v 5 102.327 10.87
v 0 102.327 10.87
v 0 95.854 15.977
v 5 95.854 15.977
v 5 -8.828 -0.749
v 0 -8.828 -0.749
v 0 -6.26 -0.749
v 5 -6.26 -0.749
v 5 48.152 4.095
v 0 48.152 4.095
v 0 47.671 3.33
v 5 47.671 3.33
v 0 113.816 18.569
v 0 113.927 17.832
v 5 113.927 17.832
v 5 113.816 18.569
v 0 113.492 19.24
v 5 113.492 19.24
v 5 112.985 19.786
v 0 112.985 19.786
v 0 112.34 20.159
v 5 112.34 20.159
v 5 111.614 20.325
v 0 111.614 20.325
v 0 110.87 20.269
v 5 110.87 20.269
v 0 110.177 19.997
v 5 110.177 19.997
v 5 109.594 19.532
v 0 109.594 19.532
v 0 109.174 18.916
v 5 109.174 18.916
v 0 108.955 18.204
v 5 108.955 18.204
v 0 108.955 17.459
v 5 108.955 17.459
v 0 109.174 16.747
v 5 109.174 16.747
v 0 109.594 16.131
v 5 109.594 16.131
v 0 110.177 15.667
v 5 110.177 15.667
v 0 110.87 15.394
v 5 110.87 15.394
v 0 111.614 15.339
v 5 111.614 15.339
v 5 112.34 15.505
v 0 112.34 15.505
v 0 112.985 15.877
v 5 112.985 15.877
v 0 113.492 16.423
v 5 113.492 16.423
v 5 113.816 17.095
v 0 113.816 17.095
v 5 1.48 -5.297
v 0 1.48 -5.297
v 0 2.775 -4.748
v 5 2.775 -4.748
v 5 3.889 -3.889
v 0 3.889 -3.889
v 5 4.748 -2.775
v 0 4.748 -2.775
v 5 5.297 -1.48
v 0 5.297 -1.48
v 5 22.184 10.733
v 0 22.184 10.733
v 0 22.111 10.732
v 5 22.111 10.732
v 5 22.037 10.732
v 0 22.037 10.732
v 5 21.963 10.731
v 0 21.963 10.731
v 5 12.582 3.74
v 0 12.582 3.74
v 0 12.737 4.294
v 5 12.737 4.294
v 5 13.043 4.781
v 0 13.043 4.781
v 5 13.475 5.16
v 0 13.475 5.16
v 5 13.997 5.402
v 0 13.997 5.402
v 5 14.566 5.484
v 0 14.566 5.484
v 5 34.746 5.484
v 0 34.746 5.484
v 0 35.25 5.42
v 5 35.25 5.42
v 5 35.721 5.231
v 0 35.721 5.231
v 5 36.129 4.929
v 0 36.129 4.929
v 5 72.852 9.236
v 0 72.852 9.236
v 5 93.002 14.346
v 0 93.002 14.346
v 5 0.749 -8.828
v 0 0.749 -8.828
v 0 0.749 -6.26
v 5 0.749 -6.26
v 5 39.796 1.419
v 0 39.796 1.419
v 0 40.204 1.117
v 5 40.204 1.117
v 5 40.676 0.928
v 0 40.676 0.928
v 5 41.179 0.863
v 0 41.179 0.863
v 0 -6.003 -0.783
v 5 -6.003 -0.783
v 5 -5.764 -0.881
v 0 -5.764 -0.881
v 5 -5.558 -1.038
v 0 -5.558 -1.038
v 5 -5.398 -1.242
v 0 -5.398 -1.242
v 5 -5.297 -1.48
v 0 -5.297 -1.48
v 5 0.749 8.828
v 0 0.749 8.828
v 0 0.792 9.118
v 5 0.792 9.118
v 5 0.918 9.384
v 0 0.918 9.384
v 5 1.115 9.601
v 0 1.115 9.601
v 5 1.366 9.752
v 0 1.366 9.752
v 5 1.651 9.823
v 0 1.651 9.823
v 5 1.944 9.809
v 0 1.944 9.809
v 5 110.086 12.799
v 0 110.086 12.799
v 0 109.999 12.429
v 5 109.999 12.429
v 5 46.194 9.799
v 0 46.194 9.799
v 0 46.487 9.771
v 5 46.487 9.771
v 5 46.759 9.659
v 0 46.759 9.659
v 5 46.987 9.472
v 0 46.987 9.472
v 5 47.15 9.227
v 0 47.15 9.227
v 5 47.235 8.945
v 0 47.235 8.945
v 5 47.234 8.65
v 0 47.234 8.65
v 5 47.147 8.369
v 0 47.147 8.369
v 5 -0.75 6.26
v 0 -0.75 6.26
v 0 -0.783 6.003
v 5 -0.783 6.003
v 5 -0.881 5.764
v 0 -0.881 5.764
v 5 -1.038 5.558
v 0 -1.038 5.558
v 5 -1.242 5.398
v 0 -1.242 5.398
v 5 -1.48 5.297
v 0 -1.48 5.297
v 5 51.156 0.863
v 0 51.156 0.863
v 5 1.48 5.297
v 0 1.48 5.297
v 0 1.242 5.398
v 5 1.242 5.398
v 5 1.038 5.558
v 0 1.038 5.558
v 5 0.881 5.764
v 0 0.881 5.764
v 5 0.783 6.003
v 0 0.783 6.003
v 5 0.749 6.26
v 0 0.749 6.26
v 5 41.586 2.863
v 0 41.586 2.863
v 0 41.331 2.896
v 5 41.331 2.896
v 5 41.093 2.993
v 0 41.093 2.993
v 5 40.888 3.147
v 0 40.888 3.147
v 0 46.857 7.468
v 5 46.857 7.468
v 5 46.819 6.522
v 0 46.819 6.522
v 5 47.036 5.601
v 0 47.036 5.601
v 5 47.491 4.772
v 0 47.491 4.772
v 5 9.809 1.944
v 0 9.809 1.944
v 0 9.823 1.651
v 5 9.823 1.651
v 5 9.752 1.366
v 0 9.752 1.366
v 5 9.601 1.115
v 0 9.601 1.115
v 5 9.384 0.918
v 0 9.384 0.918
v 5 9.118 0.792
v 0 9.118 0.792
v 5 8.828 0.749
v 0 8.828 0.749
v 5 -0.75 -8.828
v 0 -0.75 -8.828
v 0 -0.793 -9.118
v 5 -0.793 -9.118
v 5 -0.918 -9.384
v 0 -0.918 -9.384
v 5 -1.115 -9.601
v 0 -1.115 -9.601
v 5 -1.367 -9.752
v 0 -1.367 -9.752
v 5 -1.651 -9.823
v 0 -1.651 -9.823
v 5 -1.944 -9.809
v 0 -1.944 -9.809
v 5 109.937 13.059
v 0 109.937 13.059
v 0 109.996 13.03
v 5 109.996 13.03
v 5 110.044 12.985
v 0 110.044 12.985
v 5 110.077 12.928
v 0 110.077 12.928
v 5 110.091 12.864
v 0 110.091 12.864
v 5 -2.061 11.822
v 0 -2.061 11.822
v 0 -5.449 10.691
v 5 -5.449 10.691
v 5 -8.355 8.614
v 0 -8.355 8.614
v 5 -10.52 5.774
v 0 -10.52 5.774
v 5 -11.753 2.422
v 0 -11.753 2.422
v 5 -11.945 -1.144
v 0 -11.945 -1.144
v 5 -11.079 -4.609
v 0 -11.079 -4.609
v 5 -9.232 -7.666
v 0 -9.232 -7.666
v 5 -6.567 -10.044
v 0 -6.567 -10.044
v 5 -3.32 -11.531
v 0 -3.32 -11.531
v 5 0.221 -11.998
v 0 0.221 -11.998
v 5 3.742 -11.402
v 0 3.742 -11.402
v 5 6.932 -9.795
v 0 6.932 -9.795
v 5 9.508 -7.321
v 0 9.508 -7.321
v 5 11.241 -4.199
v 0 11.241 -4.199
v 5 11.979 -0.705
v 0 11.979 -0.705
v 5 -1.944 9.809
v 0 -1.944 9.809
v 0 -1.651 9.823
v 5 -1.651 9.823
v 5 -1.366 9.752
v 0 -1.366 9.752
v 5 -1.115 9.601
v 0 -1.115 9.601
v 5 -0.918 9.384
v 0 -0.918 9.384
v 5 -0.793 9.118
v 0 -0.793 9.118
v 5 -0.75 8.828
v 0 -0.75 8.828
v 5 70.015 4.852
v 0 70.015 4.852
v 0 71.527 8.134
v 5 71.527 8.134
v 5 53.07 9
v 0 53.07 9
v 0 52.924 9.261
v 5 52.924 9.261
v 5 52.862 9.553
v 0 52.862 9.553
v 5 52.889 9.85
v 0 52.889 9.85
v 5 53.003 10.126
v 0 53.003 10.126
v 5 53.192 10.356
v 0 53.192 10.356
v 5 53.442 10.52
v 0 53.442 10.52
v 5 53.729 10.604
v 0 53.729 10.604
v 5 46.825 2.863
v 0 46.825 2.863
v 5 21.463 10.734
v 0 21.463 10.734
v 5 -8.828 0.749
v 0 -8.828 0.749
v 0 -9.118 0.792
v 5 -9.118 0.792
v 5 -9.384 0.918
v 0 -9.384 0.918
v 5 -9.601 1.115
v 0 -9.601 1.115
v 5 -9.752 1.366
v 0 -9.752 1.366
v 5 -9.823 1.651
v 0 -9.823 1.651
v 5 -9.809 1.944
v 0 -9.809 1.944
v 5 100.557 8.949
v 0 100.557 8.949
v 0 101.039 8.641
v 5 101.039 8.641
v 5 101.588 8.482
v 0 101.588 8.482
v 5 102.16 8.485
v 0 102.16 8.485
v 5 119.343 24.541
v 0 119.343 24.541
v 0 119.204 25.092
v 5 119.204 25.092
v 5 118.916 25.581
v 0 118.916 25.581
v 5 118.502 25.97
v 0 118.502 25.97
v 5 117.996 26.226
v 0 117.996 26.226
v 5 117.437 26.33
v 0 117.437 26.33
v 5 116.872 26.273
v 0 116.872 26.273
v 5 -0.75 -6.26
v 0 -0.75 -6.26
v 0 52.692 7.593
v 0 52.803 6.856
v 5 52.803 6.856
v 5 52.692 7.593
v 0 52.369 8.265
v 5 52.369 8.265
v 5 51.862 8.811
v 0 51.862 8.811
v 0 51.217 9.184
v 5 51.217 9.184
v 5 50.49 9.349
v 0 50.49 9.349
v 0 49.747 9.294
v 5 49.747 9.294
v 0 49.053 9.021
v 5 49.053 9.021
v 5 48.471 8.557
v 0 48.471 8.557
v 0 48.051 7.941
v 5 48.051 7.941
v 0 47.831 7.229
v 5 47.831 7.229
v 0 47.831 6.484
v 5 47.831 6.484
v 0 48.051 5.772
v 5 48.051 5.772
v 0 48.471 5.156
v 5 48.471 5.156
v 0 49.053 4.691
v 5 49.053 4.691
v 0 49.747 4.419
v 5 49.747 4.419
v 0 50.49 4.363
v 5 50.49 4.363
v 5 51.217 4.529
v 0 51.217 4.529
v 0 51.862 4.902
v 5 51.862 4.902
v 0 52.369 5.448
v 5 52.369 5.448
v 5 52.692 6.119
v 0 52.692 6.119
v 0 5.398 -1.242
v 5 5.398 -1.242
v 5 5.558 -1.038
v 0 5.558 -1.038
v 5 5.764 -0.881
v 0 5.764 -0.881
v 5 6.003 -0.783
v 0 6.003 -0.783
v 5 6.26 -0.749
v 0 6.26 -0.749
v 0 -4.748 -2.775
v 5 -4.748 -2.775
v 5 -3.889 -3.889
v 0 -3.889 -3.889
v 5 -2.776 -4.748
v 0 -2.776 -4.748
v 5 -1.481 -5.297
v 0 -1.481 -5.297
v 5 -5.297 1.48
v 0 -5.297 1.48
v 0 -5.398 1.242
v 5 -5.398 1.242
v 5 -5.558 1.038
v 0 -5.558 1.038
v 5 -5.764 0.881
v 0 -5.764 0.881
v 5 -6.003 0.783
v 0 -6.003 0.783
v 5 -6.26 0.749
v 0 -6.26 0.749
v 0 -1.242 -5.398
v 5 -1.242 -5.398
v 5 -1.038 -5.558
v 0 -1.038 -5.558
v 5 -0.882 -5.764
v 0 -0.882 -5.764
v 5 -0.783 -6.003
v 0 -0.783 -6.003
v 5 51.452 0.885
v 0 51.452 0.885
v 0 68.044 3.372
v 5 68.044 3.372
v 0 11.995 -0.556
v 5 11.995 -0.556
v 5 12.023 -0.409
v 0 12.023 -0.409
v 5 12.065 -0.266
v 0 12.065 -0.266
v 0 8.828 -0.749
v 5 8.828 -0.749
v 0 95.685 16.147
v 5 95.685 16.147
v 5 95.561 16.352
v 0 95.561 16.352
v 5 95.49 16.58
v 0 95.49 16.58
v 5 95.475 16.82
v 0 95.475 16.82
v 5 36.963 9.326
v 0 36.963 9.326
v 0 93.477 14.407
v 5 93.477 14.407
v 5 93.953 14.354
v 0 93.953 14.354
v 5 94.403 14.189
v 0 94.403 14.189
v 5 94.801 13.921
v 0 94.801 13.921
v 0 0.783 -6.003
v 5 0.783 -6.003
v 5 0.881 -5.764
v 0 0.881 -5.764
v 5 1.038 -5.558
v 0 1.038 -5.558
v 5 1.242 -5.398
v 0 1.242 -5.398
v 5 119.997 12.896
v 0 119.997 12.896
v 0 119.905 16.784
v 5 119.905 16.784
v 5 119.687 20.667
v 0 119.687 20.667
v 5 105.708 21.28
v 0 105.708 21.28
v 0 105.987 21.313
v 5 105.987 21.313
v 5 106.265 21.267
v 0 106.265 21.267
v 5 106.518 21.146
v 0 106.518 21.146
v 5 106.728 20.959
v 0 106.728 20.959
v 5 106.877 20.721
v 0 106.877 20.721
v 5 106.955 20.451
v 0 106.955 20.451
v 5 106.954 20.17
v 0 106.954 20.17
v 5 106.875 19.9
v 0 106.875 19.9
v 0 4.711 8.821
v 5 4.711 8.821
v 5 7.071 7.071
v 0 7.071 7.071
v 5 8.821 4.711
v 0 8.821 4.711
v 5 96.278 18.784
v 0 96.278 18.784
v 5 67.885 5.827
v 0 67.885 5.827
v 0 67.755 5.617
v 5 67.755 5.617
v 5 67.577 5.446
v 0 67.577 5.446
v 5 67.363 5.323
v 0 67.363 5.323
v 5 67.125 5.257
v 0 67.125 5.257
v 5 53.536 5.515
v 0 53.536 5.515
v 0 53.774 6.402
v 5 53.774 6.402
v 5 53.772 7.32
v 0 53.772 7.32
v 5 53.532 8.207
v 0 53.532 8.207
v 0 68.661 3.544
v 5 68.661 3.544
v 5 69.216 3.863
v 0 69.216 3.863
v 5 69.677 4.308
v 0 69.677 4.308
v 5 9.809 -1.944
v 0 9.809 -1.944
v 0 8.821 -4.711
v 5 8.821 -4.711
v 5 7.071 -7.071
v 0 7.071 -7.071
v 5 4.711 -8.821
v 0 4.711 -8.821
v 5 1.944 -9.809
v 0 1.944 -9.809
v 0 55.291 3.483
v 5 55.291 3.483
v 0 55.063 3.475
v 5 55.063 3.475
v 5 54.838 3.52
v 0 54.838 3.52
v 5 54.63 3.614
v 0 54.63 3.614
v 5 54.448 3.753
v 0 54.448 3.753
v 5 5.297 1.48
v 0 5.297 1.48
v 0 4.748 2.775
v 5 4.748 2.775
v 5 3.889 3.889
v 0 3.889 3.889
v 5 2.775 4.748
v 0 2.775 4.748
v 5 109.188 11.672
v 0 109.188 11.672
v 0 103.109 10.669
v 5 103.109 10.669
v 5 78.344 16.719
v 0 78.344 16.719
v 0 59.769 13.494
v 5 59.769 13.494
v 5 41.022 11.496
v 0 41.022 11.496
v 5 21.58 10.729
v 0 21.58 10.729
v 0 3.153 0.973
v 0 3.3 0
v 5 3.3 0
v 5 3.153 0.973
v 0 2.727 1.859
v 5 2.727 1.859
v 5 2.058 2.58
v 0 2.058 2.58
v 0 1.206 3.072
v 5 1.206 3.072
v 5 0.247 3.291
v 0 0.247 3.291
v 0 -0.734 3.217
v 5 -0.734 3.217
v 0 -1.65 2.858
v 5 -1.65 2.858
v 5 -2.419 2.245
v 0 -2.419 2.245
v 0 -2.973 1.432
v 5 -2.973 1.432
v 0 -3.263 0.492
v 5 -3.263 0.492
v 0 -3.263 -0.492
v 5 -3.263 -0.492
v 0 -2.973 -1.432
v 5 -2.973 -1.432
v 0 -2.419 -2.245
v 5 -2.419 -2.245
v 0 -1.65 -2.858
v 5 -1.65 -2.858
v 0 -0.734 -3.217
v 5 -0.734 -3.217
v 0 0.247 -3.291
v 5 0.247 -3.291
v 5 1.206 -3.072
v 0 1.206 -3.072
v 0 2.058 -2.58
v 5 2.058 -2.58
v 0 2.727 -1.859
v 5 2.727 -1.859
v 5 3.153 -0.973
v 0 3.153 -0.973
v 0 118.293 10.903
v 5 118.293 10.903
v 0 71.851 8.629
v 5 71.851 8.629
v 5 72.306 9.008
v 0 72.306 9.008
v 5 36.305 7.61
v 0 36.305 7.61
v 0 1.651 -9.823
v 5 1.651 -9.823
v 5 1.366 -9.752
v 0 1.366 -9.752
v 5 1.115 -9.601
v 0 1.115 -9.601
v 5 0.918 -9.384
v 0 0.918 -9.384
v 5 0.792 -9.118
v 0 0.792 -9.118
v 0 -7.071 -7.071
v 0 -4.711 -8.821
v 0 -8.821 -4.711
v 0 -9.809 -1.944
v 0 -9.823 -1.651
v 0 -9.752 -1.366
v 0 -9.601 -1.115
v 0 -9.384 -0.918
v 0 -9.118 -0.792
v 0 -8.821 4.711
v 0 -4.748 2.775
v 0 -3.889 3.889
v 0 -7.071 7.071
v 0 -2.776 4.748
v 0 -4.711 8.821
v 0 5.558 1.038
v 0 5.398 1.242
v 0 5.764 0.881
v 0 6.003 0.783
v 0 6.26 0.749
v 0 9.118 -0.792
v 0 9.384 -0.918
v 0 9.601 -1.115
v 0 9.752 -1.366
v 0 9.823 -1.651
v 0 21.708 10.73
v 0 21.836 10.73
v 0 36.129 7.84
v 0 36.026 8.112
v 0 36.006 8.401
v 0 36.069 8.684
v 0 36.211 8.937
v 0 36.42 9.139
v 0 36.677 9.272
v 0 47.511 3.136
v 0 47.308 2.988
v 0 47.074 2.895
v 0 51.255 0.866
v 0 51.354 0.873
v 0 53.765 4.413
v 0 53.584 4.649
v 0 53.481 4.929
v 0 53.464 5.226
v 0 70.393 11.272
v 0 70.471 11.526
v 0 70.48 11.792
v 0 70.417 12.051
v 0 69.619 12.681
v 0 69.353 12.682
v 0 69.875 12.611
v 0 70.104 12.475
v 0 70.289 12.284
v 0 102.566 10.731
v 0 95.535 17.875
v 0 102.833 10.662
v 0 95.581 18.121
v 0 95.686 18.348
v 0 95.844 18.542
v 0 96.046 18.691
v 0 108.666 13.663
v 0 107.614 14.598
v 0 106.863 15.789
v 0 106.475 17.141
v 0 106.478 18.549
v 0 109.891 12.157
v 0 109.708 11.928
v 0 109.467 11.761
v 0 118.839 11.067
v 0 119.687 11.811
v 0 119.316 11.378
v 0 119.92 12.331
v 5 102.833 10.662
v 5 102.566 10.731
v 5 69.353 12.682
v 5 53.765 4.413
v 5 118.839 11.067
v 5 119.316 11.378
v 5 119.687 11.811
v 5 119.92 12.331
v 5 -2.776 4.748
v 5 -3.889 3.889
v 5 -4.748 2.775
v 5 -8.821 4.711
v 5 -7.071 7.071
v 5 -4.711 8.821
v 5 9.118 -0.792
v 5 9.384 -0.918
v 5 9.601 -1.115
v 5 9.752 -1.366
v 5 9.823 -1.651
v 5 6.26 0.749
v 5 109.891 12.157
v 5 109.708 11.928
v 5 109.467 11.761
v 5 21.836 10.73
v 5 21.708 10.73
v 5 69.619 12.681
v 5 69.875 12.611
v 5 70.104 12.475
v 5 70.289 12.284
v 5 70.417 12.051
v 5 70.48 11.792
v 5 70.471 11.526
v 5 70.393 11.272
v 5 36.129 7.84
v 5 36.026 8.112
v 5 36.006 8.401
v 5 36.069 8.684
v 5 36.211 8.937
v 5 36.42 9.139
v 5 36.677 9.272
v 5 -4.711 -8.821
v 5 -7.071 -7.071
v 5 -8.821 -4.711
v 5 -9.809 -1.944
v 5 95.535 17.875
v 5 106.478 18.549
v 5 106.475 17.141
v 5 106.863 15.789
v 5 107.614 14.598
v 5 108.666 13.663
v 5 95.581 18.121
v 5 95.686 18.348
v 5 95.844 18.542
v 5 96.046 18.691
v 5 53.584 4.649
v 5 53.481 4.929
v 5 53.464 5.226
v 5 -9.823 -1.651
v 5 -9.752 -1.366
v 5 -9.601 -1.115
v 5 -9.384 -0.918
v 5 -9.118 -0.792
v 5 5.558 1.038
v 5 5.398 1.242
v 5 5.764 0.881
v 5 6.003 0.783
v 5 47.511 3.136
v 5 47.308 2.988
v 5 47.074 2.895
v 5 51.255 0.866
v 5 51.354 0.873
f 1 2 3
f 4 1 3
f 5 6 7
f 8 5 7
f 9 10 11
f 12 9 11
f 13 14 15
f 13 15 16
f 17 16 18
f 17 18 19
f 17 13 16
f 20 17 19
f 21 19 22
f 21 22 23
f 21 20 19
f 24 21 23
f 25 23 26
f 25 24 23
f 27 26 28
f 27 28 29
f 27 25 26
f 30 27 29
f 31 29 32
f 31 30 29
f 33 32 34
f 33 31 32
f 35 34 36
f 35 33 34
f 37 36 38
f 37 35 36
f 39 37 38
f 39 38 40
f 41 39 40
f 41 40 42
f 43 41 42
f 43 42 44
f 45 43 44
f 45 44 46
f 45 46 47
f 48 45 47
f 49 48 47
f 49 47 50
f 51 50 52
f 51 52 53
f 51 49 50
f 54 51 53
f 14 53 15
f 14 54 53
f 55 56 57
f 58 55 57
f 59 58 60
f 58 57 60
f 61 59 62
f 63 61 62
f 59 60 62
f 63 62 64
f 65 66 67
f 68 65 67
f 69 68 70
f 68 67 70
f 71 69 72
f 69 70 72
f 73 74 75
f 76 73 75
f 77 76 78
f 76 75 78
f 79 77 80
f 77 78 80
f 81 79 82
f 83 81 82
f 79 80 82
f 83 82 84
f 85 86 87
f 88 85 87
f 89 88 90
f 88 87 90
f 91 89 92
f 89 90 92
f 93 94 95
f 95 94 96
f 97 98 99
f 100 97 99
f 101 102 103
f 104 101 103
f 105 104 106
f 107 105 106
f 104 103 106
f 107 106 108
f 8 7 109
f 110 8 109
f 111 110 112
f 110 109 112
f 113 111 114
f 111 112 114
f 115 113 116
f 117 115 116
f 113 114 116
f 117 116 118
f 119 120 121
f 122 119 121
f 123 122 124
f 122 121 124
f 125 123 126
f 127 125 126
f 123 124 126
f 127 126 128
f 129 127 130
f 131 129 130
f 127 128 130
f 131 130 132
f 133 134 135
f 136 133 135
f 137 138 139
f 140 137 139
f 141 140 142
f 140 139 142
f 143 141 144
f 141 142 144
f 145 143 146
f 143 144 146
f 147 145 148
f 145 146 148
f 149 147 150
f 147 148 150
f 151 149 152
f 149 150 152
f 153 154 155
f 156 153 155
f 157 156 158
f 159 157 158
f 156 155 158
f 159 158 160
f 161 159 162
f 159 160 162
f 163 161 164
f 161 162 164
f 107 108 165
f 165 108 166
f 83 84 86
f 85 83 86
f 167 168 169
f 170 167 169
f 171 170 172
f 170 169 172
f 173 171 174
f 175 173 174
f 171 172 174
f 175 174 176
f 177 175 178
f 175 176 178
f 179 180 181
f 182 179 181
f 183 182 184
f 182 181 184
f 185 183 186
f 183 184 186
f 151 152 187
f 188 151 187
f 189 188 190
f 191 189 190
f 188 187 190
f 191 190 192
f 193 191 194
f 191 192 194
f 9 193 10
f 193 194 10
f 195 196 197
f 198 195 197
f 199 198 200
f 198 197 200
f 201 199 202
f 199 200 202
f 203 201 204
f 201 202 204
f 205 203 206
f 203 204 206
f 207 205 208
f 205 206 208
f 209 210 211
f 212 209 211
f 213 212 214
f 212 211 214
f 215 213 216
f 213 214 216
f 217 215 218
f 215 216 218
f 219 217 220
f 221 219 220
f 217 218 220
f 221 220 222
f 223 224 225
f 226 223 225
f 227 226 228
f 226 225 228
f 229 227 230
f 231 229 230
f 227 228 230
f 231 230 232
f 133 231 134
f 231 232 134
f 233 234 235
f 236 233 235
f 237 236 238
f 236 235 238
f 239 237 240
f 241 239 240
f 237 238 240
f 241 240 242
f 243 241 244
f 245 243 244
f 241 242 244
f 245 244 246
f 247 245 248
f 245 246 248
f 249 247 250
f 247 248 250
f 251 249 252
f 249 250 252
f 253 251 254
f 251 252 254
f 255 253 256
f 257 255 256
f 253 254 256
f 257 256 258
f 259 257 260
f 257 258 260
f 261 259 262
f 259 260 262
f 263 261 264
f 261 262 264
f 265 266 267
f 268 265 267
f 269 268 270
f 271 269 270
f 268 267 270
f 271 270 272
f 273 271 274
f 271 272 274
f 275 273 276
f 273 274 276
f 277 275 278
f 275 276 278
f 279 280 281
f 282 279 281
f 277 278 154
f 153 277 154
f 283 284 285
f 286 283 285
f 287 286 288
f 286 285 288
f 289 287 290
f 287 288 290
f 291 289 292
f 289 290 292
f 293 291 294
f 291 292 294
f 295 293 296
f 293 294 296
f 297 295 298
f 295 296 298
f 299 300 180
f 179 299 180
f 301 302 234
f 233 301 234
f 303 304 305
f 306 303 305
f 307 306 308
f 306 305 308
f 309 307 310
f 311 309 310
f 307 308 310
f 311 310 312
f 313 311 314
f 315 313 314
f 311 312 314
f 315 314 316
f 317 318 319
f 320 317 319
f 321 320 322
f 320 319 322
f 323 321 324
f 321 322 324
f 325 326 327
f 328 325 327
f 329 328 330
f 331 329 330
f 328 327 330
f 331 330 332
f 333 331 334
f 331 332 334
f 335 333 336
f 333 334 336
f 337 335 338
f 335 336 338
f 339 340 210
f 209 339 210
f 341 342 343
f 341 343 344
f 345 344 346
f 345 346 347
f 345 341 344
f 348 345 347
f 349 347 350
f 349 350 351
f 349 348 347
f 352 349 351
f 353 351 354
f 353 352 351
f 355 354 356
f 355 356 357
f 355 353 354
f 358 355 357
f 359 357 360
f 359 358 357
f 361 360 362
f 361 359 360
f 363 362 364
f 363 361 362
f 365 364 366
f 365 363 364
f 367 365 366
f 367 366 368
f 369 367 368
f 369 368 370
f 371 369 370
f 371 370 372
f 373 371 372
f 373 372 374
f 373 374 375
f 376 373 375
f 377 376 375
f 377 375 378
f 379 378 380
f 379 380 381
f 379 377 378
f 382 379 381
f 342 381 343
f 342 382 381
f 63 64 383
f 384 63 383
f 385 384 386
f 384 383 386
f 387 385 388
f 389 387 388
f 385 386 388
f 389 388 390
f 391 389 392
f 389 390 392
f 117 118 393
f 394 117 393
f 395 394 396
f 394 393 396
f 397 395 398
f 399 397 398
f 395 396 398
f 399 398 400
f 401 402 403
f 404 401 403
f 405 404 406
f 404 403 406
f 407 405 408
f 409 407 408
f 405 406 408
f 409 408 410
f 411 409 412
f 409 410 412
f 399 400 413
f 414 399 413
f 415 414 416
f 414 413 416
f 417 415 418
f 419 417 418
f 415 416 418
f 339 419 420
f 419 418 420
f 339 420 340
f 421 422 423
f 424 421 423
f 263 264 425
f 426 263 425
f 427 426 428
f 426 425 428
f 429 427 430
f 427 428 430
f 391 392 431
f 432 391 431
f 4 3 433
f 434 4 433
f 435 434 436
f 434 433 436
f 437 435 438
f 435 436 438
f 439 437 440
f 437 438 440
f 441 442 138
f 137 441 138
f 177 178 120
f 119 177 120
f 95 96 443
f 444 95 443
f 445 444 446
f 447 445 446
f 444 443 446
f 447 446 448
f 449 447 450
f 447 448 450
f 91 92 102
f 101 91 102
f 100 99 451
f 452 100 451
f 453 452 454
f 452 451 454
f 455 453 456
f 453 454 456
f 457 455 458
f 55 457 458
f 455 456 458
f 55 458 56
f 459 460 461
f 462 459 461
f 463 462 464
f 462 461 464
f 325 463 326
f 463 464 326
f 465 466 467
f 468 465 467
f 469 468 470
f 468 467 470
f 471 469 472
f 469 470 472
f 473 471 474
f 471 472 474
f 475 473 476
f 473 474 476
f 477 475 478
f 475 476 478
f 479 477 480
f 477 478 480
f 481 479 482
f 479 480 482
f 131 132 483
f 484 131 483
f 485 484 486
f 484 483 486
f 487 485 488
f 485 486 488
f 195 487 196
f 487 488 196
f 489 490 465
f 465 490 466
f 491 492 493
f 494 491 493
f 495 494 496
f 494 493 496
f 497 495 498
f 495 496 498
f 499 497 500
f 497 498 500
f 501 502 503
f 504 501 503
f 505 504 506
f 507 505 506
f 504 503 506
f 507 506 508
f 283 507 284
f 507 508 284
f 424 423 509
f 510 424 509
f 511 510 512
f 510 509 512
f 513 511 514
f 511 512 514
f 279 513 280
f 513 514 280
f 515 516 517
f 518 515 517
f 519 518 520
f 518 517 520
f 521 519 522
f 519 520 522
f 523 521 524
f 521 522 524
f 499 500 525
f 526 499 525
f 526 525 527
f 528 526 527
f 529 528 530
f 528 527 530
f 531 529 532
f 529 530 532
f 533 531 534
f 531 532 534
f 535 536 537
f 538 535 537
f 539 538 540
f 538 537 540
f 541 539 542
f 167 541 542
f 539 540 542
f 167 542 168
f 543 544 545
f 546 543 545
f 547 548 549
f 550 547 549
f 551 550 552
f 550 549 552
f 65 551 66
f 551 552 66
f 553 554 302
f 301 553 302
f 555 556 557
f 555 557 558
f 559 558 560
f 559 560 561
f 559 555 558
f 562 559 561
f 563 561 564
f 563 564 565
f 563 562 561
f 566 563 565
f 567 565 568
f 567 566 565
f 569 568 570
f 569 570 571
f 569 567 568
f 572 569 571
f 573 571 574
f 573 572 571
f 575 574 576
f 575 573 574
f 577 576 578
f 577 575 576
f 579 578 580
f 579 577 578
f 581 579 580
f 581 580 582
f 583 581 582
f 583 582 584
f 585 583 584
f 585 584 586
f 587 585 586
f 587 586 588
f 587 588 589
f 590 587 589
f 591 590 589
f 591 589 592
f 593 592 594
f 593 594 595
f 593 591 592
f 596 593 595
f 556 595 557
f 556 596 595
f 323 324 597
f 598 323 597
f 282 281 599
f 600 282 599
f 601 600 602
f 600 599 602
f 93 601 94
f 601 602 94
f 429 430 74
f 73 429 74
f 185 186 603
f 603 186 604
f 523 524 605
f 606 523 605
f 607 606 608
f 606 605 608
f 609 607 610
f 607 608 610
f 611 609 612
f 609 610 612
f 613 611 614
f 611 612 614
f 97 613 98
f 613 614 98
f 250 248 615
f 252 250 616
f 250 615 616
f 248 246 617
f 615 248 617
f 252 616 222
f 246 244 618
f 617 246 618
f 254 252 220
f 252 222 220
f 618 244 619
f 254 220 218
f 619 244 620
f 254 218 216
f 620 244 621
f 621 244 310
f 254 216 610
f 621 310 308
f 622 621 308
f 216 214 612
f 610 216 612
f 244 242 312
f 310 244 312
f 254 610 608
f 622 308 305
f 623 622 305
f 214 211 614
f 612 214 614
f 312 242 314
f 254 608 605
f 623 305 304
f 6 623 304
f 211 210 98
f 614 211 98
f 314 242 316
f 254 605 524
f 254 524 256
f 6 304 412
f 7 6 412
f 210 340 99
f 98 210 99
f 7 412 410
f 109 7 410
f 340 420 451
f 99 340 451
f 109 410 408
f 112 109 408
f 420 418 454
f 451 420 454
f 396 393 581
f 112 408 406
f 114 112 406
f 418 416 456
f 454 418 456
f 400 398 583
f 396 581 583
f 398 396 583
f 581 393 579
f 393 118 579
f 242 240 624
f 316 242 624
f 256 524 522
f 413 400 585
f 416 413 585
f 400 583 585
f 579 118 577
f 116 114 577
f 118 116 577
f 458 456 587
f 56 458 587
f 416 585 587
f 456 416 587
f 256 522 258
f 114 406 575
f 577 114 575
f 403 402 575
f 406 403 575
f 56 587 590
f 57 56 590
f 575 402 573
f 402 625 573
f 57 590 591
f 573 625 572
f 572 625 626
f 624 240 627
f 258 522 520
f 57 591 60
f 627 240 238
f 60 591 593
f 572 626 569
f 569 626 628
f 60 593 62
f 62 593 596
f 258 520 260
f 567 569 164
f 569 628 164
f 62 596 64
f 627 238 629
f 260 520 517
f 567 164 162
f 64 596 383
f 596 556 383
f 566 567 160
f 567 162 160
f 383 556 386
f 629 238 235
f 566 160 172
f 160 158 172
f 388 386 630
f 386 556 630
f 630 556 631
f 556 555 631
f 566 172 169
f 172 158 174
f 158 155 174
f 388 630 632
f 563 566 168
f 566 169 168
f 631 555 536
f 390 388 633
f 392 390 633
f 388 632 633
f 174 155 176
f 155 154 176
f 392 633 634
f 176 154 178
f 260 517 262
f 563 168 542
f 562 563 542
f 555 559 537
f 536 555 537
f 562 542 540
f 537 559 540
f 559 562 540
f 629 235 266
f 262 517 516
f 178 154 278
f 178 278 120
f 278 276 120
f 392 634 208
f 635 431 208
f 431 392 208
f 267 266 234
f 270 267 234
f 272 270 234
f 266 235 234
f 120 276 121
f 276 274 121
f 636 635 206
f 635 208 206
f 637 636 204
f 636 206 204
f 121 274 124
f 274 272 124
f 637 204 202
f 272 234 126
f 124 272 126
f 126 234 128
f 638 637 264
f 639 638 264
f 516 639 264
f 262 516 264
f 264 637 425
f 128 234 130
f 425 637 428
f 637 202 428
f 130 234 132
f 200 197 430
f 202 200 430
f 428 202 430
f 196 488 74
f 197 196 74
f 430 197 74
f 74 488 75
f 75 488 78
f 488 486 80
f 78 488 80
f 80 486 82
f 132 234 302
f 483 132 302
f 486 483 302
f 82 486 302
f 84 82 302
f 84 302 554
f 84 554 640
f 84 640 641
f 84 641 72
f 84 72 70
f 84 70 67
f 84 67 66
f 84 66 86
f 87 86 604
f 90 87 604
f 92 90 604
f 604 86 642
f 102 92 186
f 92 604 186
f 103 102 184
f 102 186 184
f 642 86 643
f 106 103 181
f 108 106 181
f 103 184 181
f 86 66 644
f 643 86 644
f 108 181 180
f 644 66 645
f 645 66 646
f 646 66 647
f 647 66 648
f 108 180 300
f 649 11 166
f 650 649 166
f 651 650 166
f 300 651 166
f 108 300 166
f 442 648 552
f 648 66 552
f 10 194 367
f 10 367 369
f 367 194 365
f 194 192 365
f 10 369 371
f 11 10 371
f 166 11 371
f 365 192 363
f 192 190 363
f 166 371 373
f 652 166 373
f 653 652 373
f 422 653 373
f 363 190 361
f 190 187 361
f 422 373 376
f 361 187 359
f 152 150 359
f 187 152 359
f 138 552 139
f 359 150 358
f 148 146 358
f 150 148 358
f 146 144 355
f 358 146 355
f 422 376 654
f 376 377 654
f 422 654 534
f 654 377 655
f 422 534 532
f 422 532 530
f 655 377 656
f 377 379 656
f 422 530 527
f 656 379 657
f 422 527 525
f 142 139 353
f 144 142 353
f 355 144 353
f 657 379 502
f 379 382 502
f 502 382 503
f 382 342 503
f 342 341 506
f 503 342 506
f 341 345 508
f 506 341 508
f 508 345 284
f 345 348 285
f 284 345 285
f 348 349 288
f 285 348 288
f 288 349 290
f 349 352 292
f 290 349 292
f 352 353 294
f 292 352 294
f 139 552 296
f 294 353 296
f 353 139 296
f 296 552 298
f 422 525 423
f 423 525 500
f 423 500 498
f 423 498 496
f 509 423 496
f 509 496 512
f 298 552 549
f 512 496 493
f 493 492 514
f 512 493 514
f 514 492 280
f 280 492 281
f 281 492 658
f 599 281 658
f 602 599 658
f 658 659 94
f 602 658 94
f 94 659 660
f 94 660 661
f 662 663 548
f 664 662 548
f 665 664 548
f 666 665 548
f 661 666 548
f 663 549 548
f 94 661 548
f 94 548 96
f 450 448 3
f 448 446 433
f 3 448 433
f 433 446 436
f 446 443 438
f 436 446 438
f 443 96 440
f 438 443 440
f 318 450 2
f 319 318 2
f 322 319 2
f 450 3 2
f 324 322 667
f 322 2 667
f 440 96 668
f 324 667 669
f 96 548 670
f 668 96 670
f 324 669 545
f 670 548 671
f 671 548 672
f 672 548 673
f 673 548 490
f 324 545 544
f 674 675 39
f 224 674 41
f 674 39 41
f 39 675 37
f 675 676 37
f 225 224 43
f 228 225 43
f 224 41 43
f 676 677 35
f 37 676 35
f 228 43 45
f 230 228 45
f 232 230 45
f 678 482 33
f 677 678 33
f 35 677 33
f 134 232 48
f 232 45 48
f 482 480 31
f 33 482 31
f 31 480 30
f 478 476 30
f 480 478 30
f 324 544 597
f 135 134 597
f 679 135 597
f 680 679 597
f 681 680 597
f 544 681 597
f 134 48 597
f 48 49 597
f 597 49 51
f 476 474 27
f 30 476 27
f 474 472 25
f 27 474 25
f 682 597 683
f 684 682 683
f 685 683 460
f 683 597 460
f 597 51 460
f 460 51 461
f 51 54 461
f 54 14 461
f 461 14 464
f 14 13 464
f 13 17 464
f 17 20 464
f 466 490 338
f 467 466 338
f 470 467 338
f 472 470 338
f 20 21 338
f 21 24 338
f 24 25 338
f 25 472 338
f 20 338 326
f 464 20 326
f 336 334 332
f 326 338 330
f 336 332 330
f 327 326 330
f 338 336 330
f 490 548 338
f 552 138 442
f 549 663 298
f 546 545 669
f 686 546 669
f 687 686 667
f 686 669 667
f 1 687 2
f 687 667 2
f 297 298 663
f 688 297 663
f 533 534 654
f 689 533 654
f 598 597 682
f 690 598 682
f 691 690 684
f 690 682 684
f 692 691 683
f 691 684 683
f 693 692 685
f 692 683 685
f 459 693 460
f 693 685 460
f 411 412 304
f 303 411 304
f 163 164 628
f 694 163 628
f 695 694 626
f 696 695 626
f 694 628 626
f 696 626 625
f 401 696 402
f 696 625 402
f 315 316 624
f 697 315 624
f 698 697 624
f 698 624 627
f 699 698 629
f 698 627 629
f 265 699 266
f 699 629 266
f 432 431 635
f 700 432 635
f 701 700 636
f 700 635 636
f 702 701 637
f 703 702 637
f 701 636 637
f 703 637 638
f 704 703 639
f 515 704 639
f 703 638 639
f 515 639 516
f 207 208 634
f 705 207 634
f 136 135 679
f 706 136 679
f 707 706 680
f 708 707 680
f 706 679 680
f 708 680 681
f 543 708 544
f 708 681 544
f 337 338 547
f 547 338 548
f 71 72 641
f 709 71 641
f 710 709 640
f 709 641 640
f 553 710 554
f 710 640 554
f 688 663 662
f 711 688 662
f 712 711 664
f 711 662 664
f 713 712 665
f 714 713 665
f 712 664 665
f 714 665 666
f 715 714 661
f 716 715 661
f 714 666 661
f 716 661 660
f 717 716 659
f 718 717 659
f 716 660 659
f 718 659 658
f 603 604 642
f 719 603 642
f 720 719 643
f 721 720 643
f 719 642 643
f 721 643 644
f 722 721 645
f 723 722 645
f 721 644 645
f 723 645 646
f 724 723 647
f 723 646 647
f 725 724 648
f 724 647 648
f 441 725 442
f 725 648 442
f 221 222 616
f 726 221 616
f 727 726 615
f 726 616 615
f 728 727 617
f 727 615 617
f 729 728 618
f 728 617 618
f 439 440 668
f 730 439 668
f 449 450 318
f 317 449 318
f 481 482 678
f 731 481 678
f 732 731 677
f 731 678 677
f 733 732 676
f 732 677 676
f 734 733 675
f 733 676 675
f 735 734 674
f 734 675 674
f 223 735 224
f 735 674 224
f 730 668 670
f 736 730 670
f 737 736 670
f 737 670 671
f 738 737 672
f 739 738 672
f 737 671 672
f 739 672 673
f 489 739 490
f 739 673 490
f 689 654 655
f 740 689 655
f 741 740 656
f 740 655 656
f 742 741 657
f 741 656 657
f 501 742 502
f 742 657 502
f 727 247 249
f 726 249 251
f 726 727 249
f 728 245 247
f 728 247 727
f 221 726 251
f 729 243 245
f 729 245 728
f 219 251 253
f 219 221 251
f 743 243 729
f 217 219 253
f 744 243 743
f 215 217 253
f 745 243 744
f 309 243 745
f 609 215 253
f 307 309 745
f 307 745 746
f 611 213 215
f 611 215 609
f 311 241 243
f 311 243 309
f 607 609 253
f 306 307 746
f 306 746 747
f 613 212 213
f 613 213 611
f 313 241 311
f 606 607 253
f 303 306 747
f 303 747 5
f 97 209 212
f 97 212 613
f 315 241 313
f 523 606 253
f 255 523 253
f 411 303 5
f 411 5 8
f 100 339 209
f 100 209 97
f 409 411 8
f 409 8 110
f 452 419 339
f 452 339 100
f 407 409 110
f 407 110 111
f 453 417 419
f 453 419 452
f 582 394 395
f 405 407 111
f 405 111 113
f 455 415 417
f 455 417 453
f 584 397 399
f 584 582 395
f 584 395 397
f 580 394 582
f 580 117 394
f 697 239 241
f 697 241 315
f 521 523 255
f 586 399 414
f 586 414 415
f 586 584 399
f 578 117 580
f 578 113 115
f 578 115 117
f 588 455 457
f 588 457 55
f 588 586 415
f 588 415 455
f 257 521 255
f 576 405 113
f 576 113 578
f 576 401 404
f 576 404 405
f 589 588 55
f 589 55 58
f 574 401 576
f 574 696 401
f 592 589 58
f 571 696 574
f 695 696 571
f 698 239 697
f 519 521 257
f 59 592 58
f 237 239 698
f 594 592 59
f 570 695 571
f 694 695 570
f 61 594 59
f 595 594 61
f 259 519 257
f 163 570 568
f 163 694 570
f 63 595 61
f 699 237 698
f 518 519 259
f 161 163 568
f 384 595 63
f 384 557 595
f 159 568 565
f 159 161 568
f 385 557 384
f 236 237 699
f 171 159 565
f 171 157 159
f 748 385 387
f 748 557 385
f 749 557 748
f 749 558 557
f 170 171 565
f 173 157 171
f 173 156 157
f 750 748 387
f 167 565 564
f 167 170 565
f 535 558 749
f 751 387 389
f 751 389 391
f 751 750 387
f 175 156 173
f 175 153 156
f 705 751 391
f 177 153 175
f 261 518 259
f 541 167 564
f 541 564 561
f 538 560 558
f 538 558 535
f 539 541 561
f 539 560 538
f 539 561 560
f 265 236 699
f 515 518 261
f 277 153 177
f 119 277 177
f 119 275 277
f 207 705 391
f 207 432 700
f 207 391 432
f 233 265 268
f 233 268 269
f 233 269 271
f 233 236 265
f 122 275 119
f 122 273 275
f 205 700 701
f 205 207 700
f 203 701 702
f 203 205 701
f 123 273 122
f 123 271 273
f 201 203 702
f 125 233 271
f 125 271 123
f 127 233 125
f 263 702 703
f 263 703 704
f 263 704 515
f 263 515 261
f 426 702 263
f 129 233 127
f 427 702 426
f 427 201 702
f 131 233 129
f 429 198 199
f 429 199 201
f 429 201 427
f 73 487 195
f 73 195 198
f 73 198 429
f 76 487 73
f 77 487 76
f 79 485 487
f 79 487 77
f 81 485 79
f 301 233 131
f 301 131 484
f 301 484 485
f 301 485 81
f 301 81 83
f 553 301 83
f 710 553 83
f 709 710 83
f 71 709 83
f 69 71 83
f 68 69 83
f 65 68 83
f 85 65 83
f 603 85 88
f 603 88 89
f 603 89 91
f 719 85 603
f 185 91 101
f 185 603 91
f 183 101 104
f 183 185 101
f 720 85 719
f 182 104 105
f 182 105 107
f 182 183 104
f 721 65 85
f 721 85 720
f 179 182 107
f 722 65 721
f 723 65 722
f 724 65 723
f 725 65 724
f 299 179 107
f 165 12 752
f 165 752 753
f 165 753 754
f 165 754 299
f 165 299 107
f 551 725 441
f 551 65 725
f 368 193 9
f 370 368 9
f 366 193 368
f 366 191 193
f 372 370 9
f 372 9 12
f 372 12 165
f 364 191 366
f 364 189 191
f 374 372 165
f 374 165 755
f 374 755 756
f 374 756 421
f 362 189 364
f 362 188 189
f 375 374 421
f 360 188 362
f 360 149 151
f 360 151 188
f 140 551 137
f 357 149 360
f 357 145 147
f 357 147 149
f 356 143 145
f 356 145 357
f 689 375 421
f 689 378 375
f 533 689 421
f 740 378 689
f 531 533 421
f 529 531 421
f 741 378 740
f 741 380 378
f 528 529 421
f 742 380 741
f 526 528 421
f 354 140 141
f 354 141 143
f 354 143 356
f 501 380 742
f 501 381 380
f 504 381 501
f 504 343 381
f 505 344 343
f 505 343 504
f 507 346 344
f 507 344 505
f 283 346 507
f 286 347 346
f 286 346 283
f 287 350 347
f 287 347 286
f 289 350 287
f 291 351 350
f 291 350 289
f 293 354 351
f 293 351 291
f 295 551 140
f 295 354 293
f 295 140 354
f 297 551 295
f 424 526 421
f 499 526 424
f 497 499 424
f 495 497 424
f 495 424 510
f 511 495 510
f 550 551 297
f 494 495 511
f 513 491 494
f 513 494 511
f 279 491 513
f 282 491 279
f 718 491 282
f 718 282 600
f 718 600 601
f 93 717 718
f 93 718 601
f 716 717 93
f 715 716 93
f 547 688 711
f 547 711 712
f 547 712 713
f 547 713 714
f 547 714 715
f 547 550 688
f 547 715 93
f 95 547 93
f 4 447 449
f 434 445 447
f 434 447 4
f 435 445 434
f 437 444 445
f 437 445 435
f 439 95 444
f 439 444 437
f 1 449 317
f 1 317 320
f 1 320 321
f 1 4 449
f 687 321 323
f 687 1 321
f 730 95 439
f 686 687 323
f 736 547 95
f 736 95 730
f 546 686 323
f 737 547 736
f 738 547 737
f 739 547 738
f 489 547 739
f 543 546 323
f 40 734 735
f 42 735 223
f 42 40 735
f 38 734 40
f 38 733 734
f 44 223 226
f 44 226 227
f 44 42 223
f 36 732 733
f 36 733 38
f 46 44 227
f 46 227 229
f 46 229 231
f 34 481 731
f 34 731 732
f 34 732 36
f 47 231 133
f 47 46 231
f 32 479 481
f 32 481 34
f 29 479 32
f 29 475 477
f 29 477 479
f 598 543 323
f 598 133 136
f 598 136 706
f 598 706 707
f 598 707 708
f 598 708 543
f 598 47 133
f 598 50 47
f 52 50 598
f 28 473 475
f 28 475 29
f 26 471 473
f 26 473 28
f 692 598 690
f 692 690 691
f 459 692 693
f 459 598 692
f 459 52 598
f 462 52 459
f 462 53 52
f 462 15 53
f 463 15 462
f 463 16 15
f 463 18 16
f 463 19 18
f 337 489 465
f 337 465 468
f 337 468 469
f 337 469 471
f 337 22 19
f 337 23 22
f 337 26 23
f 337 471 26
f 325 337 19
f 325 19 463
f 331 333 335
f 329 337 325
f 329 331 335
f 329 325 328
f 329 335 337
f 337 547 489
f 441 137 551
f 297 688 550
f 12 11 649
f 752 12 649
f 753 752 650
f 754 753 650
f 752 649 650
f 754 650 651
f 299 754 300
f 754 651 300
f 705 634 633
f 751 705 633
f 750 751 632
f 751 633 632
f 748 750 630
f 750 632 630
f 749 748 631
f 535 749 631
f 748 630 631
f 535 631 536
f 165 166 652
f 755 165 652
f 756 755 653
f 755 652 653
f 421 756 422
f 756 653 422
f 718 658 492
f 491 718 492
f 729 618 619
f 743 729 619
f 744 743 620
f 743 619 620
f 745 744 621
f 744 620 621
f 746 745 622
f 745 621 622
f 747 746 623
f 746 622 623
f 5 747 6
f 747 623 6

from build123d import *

# Parameters (mm, degrees)
F0_R     = 3.3
F0_R_2   = 2.5
F1_DEPTH = 5


with BuildPart() as f1:
    # F0 (on Right) → F1 (new body)
    with BuildSketch(Plane.YZ):
        with BuildLine():
            ThreePointArc((21.963381, 10.731182), (21.963038, 10.725257), (21.962693, 10.719332))
            ThreePointArc((21.962693, 10.719332), (22.073674, 10.724516), (22.184469, 10.732781))
            ThreePointArc((22.184469, 10.732781), (22.073925, 10.73196), (21.963381, 10.731182))
        make_face()
        with BuildLine():
            ThreePointArc((21.462557, 10.734239), (21.646861, 10.721449), (21.831558, 10.717182))
            Line((21.831558, 10.717182), (21.579958, 10.728812))
            Line((21.579958, 10.728812), (21.462557, 10.734239))
        make_face()
        with BuildLine():
            ThreePointArc((21.831558, 10.717182), (21.897134, 10.71772), (21.962693, 10.719332))
            ThreePointArc((21.962693, 10.719332), (21.963038, 10.725257), (21.963381, 10.731182))
            ThreePointArc((21.963381, 10.731182), (21.77167, 10.729933), (21.579958, 10.728812))
            Line((21.579958, 10.728812), (21.831558, 10.717182))
        make_face()
        with BuildLine():
            ThreePointArc((22.184469, 10.732781), (22.073674, 10.724516), (21.962693, 10.719332))
            ThreePointArc((21.962693, 10.719332), (21.897134, 10.71772), (21.831558, 10.717182))
            ThreePointArc((21.831558, 10.717182), (21.646861, 10.721449), (21.462557, 10.734239))
            Line((21.462557, 10.734239), (-2.061471, 11.821605))
            ThreePointArc((-2.061471, 11.821605), (-7.98857, -8.954482), (11.979296, -0.704597))
            ThreePointArc((11.979296, -0.704597), (12.007482, -0.482238), (12.065266, -0.265676))
            Line((12.065266, -0.265676), (12.582355, 3.74023))
            ThreePointArc((12.582355, 3.74023), (13.245307, 4.986202), (14.565898, 5.484191))
            Line((14.565898, 5.484191), (34.746018, 5.484191))
            ThreePointArc((34.746018, 5.484191), (35.491172, 5.340193), (36.129026, 4.928936))
            Line((36.129026, 4.928936), (39.796153, 1.418513))
            ThreePointArc((39.796153, 1.418513), (40.434006, 1.007255), (41.179161, 0.863258))
            Line((41.179161, 0.863258), (51.156007, 0.863258))
            ThreePointArc((51.156007, 0.863258), (51.304636, 0.868788), (51.452444, 0.885349))
            Line((51.452444, 0.885349), (68.043756, 3.371954))
            ThreePointArc((68.043756, 3.371954), (69.216393, 3.862727), (70.01494, 4.851797))
            Line((70.01494, 4.851797), (71.526809, 8.134342))
            ThreePointArc((71.526809, 8.134342), (72.064516, 8.835349), (72.851775, 9.2363))
            Line((72.851775, 9.2363), (93.001659, 14.346079))
            ThreePointArc((93.001659, 14.346079), (93.95316, 14.353851), (94.800564, 13.921045))
            Line((94.800564, 13.921045), (100.556748, 8.949467))
            ThreePointArc((100.556748, 8.949467), (101.307844, 8.541964), (102.160474, 8.485161))
            Line((102.160474, 8.485161), (118.293149, 10.903028))
            ThreePointArc((118.293149, 10.903028), (119.516973, 11.581397), (119.996656, 12.895869))
            ThreePointArc((119.996656, 12.895869), (119.811332, 18.726411), (119.342875, 24.541058))
            ThreePointArc((119.342875, 24.541058), (118.50203, 25.969609), (116.872434, 26.273241))
            Line((116.872434, 26.273241), (78.344445, 16.718787))
            ThreePointArc((78.344445, 16.718787), (50.412085, 12.340754), (22.184469, 10.732781))
        make_face()
        with BuildLine():
            ThreePointArc((-9.809251, -1.943858), (-9.601109, -1.114802), (-8.828326, -0.749472))
            Line((-8.828326, -0.749472), (-6.260139, -0.749472))
            ThreePointArc((-6.260139, -0.749472), (-5.655635, -0.95287), (-5.297041, -1.480323))
            ThreePointArc((-5.297041, -1.480323), (-3.88922, -3.888954), (-1.480686, -5.29694))
            ThreePointArc((-1.480686, -5.29694), (-0.95327, -5.655553), (-0.749901, -6.260046))
            Line((-0.749901, -6.260046), (-0.749969, -8.828254))
            ThreePointArc((-0.749969, -8.828254), (-1.11533, -9.601037), (-1.94441, -9.809142))
            ThreePointArc((-1.94441, -9.809142), (-7.071267, -7.070869), (-9.809251, -1.943858))
        make_face(mode=Mode.SUBTRACT)
        with BuildLine():
            ThreePointArc((9.809251, -1.943858), (7.071068, -7.071068), (1.943858, -9.809251))
            ThreePointArc((1.943858, -9.809251), (1.114802, -9.601109), (0.749472, -8.828326))
            Line((0.749472, -8.828326), (0.749472, -6.260139))
            ThreePointArc((0.749472, -6.260139), (0.95287, -5.655635), (1.480323, -5.297041))
            ThreePointArc((1.480323, -5.297041), (3.889087, -3.889087), (5.297041, -1.480323))
            ThreePointArc((5.297041, -1.480323), (5.655635, -0.95287), (6.260139, -0.749472))
            Line((6.260139, -0.749472), (8.828326, -0.749472))
            ThreePointArc((8.828326, -0.749472), (9.601109, -1.114802), (9.809251, -1.943858))
        make_face(mode=Mode.SUBTRACT)
        Circle(F0_R, mode=Mode.SUBTRACT)
        with BuildLine():
            Line((-6.260139, 0.749472), (-8.828326, 0.749472))
            ThreePointArc((-8.828326, 0.749472), (-9.601109, 1.114802), (-9.809251, 1.943858))
            ThreePointArc((-9.809251, 1.943858), (-7.07108, 7.071056), (-1.943892, 9.809245))
            ThreePointArc((-1.943892, 9.809245), (-1.114823, 9.601096), (-0.749503, 8.828294))
            Line((-0.749503, 8.828294), (-0.749571, 6.260086))
            ThreePointArc((-0.749571, 6.260086), (-0.952972, 5.655604), (-1.480406, 5.297018))
            ThreePointArc((-1.480406, 5.297018), (-3.889118, 3.889057), (-5.297041, 1.480323))
            ThreePointArc((-5.297041, 1.480323), (-5.655635, 0.95287), (-6.260139, 0.749472))
        make_face(mode=Mode.SUBTRACT)
        with BuildLine():
            Line((0.749472, 6.260139), (0.749472, 8.828326))
            ThreePointArc((0.749472, 8.828326), (1.114802, 9.601109), (1.943858, 9.809251))
            ThreePointArc((1.943858, 9.809251), (7.071068, 7.071068), (9.809251, 1.943858))
            ThreePointArc((9.809251, 1.943858), (9.601109, 1.114802), (8.828326, 0.749472))
            Line((8.828326, 0.749472), (6.260139, 0.749472))
            ThreePointArc((6.260139, 0.749472), (5.655635, 0.95287), (5.297041, 1.480323))
            ThreePointArc((5.297041, 1.480323), (3.889087, 3.889087), (1.480323, 5.297041))
            ThreePointArc((1.480323, 5.297041), (0.95287, 5.655635), (0.749472, 6.260139))
        make_face(mode=Mode.SUBTRACT)
        with BuildLine():
            ThreePointArc((46.19369, 9.799431), (47.077203, 9.35514), (47.146779, 8.368656))
            ThreePointArc((47.146779, 8.368656), (46.896258, 6.054576), (48.152498, 4.095088))
            Line((48.152498, 4.095088), (47.670785, 3.330302))
            ThreePointArc((47.670785, 3.330302), (47.307883, 2.98777), (46.824642, 2.863258))
            Line((46.824642, 2.863258), (41.585667, 2.863258))
            ThreePointArc((41.585667, 2.863258), (41.209086, 2.936874), (40.88795, 3.146884))
            Line((40.88795, 3.146884), (36.305408, 7.610078))
            ThreePointArc((36.305408, 7.610078), (36.069285, 8.684144), (36.96252, 9.325627))
            Line((36.96252, 9.325627), (46.19369, 9.799431))
        make_face(mode=Mode.SUBTRACT)
        with Locations((50.303187, 6.856344)):
            Circle(F0_R_2, mode=Mode.SUBTRACT)
        with BuildLine():
            Line((67.125234, 5.256629), (55.291258, 3.483024))
            ThreePointArc((55.291258, 3.483024), (54.838264, 3.519554), (54.448218, 3.752796))
            Line((54.448218, 3.752796), (53.764933, 4.412935))
            ThreePointArc((53.764933, 4.412935), (53.480633, 4.92884), (53.536072, 5.515279))
            ThreePointArc((53.536072, 5.515279), (53.772295, 7.320339), (53.070006, 8.999872))
            ThreePointArc((53.070006, 8.999872), (52.93551, 9.992236), (53.72869, 10.60358))
            Line((53.72869, 10.60358), (69.352887, 12.681545))
            ThreePointArc((69.352887, 12.681545), (70.289379, 12.284015), (70.393014, 11.271934))
            Line((70.393014, 11.271934), (67.885307, 5.827244))
            ThreePointArc((67.885307, 5.827244), (67.577394, 5.445867), (67.125234, 5.256629))
        make_face(mode=Mode.SUBTRACT)
        with BuildLine():
            ThreePointArc((105.708219, 21.280173), (106.727909, 20.958857), (106.874517, 19.89984))
            ThreePointArc((106.874517, 19.89984), (106.863277, 15.788601), (109.9374, 13.058734))
            ThreePointArc((109.9374, 13.058734), (110.062622, 12.958027), (110.08565, 12.798992))
            Line((110.08565, 12.798992), (109.998683, 12.429304))
            ThreePointArc((109.998683, 12.429304), (109.708097, 11.927734), (109.188068, 11.671643))
            Line((109.188068, 11.671643), (103.109307, 10.668558))
            ThreePointArc((103.109307, 10.668558), (102.696959, 10.686849), (102.327124, 10.870116))
            Line((102.327124, 10.870116), (95.85372, 15.977033))
            ThreePointArc((95.85372, 15.977033), (95.561116, 16.351886), (95.474738, 16.819509))
            Line((95.474738, 16.819509), (95.535401, 17.875044))
            ThreePointArc((95.535401, 17.875044), (95.759171, 18.450139), (96.277906, 18.784384))
            Line((96.277906, 18.784384), (105.708219, 21.280173))
        make_face(mode=Mode.SUBTRACT)
        with Locations((111.426774, 17.831758)):
            Circle(F0_R_2, mode=Mode.SUBTRACT)
    extrude(amount=F1_DEPTH)


solid = f1.part
